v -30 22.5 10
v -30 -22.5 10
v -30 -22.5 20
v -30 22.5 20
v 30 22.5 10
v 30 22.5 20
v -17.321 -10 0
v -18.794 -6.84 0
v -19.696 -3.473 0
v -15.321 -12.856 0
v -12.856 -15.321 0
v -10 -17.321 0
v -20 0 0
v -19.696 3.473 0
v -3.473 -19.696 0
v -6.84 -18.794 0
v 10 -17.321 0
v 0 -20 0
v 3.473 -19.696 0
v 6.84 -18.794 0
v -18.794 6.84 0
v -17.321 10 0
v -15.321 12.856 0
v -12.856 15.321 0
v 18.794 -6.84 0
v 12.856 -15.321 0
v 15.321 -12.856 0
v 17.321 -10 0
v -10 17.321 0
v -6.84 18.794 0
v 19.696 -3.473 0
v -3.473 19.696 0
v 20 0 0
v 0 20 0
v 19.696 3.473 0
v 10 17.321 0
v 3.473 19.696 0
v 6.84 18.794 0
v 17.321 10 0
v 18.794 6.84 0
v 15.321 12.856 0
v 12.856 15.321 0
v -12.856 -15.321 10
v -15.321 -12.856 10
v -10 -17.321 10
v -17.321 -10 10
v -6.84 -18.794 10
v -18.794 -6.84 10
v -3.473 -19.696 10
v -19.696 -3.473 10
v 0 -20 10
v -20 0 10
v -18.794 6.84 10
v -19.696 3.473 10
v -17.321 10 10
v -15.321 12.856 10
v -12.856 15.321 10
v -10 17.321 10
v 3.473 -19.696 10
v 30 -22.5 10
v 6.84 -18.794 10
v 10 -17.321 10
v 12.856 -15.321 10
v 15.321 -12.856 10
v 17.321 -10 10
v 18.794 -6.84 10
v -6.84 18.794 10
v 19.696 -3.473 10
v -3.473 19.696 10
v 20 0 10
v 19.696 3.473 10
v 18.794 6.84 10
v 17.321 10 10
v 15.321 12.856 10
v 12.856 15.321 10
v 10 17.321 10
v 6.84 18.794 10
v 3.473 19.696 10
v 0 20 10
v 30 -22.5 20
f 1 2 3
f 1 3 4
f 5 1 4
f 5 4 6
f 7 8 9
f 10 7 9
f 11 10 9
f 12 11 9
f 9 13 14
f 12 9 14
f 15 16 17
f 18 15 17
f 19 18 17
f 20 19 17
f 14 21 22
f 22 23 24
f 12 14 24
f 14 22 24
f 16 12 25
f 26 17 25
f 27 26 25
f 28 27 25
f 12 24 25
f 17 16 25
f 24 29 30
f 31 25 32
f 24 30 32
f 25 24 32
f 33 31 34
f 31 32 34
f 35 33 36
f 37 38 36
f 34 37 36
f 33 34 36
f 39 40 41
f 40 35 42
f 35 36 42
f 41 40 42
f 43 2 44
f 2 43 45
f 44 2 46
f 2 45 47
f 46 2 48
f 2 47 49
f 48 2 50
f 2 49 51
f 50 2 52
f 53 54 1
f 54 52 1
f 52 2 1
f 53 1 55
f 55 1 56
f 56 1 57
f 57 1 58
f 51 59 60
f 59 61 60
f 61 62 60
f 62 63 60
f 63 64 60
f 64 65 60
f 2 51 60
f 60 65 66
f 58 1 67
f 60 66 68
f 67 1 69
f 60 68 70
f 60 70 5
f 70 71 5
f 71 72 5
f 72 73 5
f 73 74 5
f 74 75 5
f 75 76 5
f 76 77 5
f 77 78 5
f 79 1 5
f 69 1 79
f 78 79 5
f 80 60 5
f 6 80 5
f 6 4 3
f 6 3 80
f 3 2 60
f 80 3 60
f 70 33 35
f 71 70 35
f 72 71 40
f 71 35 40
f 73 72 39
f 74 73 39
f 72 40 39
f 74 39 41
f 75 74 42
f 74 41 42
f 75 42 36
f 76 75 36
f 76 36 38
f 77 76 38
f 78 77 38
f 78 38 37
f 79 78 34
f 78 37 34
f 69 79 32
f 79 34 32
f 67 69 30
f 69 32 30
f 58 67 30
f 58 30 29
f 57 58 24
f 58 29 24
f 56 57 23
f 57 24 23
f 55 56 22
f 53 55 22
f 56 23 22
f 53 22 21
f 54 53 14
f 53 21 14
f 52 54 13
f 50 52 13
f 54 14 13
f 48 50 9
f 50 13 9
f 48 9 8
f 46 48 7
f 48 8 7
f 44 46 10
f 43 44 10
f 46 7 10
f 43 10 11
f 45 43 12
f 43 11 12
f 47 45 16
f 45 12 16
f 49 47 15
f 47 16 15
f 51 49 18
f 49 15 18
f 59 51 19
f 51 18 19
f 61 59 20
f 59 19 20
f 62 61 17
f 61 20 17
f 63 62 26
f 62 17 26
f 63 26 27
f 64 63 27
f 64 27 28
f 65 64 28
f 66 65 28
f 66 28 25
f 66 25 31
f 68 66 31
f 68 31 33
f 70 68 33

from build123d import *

# Parameters (mm, degrees)
CROQUIS1_R              = 20
SALIENTE_EXTRUIR1_DEPTH = 10
CROQUIS2_W              = 60
CROQUIS2_H              = 45
SALIENTE_EXTRUIR2_DEPTH = 10


with BuildPart() as part:
    # Croquis1 → Saliente-Extruir1 (new body)
    with BuildSketch(Plane.XY):
        Circle(CROQUIS1_R)
    extrude(amount=SALIENTE_EXTRUIR1_DEPTH)

    # Croquis2 → Saliente-Extruir2 (add)
    with BuildSketch(Plane.XY.offset(10)):
        Rectangle(CROQUIS2_W, CROQUIS2_H)
    extrude(amount=SALIENTE_EXTRUIR2_DEPTH)


solid = part.part
